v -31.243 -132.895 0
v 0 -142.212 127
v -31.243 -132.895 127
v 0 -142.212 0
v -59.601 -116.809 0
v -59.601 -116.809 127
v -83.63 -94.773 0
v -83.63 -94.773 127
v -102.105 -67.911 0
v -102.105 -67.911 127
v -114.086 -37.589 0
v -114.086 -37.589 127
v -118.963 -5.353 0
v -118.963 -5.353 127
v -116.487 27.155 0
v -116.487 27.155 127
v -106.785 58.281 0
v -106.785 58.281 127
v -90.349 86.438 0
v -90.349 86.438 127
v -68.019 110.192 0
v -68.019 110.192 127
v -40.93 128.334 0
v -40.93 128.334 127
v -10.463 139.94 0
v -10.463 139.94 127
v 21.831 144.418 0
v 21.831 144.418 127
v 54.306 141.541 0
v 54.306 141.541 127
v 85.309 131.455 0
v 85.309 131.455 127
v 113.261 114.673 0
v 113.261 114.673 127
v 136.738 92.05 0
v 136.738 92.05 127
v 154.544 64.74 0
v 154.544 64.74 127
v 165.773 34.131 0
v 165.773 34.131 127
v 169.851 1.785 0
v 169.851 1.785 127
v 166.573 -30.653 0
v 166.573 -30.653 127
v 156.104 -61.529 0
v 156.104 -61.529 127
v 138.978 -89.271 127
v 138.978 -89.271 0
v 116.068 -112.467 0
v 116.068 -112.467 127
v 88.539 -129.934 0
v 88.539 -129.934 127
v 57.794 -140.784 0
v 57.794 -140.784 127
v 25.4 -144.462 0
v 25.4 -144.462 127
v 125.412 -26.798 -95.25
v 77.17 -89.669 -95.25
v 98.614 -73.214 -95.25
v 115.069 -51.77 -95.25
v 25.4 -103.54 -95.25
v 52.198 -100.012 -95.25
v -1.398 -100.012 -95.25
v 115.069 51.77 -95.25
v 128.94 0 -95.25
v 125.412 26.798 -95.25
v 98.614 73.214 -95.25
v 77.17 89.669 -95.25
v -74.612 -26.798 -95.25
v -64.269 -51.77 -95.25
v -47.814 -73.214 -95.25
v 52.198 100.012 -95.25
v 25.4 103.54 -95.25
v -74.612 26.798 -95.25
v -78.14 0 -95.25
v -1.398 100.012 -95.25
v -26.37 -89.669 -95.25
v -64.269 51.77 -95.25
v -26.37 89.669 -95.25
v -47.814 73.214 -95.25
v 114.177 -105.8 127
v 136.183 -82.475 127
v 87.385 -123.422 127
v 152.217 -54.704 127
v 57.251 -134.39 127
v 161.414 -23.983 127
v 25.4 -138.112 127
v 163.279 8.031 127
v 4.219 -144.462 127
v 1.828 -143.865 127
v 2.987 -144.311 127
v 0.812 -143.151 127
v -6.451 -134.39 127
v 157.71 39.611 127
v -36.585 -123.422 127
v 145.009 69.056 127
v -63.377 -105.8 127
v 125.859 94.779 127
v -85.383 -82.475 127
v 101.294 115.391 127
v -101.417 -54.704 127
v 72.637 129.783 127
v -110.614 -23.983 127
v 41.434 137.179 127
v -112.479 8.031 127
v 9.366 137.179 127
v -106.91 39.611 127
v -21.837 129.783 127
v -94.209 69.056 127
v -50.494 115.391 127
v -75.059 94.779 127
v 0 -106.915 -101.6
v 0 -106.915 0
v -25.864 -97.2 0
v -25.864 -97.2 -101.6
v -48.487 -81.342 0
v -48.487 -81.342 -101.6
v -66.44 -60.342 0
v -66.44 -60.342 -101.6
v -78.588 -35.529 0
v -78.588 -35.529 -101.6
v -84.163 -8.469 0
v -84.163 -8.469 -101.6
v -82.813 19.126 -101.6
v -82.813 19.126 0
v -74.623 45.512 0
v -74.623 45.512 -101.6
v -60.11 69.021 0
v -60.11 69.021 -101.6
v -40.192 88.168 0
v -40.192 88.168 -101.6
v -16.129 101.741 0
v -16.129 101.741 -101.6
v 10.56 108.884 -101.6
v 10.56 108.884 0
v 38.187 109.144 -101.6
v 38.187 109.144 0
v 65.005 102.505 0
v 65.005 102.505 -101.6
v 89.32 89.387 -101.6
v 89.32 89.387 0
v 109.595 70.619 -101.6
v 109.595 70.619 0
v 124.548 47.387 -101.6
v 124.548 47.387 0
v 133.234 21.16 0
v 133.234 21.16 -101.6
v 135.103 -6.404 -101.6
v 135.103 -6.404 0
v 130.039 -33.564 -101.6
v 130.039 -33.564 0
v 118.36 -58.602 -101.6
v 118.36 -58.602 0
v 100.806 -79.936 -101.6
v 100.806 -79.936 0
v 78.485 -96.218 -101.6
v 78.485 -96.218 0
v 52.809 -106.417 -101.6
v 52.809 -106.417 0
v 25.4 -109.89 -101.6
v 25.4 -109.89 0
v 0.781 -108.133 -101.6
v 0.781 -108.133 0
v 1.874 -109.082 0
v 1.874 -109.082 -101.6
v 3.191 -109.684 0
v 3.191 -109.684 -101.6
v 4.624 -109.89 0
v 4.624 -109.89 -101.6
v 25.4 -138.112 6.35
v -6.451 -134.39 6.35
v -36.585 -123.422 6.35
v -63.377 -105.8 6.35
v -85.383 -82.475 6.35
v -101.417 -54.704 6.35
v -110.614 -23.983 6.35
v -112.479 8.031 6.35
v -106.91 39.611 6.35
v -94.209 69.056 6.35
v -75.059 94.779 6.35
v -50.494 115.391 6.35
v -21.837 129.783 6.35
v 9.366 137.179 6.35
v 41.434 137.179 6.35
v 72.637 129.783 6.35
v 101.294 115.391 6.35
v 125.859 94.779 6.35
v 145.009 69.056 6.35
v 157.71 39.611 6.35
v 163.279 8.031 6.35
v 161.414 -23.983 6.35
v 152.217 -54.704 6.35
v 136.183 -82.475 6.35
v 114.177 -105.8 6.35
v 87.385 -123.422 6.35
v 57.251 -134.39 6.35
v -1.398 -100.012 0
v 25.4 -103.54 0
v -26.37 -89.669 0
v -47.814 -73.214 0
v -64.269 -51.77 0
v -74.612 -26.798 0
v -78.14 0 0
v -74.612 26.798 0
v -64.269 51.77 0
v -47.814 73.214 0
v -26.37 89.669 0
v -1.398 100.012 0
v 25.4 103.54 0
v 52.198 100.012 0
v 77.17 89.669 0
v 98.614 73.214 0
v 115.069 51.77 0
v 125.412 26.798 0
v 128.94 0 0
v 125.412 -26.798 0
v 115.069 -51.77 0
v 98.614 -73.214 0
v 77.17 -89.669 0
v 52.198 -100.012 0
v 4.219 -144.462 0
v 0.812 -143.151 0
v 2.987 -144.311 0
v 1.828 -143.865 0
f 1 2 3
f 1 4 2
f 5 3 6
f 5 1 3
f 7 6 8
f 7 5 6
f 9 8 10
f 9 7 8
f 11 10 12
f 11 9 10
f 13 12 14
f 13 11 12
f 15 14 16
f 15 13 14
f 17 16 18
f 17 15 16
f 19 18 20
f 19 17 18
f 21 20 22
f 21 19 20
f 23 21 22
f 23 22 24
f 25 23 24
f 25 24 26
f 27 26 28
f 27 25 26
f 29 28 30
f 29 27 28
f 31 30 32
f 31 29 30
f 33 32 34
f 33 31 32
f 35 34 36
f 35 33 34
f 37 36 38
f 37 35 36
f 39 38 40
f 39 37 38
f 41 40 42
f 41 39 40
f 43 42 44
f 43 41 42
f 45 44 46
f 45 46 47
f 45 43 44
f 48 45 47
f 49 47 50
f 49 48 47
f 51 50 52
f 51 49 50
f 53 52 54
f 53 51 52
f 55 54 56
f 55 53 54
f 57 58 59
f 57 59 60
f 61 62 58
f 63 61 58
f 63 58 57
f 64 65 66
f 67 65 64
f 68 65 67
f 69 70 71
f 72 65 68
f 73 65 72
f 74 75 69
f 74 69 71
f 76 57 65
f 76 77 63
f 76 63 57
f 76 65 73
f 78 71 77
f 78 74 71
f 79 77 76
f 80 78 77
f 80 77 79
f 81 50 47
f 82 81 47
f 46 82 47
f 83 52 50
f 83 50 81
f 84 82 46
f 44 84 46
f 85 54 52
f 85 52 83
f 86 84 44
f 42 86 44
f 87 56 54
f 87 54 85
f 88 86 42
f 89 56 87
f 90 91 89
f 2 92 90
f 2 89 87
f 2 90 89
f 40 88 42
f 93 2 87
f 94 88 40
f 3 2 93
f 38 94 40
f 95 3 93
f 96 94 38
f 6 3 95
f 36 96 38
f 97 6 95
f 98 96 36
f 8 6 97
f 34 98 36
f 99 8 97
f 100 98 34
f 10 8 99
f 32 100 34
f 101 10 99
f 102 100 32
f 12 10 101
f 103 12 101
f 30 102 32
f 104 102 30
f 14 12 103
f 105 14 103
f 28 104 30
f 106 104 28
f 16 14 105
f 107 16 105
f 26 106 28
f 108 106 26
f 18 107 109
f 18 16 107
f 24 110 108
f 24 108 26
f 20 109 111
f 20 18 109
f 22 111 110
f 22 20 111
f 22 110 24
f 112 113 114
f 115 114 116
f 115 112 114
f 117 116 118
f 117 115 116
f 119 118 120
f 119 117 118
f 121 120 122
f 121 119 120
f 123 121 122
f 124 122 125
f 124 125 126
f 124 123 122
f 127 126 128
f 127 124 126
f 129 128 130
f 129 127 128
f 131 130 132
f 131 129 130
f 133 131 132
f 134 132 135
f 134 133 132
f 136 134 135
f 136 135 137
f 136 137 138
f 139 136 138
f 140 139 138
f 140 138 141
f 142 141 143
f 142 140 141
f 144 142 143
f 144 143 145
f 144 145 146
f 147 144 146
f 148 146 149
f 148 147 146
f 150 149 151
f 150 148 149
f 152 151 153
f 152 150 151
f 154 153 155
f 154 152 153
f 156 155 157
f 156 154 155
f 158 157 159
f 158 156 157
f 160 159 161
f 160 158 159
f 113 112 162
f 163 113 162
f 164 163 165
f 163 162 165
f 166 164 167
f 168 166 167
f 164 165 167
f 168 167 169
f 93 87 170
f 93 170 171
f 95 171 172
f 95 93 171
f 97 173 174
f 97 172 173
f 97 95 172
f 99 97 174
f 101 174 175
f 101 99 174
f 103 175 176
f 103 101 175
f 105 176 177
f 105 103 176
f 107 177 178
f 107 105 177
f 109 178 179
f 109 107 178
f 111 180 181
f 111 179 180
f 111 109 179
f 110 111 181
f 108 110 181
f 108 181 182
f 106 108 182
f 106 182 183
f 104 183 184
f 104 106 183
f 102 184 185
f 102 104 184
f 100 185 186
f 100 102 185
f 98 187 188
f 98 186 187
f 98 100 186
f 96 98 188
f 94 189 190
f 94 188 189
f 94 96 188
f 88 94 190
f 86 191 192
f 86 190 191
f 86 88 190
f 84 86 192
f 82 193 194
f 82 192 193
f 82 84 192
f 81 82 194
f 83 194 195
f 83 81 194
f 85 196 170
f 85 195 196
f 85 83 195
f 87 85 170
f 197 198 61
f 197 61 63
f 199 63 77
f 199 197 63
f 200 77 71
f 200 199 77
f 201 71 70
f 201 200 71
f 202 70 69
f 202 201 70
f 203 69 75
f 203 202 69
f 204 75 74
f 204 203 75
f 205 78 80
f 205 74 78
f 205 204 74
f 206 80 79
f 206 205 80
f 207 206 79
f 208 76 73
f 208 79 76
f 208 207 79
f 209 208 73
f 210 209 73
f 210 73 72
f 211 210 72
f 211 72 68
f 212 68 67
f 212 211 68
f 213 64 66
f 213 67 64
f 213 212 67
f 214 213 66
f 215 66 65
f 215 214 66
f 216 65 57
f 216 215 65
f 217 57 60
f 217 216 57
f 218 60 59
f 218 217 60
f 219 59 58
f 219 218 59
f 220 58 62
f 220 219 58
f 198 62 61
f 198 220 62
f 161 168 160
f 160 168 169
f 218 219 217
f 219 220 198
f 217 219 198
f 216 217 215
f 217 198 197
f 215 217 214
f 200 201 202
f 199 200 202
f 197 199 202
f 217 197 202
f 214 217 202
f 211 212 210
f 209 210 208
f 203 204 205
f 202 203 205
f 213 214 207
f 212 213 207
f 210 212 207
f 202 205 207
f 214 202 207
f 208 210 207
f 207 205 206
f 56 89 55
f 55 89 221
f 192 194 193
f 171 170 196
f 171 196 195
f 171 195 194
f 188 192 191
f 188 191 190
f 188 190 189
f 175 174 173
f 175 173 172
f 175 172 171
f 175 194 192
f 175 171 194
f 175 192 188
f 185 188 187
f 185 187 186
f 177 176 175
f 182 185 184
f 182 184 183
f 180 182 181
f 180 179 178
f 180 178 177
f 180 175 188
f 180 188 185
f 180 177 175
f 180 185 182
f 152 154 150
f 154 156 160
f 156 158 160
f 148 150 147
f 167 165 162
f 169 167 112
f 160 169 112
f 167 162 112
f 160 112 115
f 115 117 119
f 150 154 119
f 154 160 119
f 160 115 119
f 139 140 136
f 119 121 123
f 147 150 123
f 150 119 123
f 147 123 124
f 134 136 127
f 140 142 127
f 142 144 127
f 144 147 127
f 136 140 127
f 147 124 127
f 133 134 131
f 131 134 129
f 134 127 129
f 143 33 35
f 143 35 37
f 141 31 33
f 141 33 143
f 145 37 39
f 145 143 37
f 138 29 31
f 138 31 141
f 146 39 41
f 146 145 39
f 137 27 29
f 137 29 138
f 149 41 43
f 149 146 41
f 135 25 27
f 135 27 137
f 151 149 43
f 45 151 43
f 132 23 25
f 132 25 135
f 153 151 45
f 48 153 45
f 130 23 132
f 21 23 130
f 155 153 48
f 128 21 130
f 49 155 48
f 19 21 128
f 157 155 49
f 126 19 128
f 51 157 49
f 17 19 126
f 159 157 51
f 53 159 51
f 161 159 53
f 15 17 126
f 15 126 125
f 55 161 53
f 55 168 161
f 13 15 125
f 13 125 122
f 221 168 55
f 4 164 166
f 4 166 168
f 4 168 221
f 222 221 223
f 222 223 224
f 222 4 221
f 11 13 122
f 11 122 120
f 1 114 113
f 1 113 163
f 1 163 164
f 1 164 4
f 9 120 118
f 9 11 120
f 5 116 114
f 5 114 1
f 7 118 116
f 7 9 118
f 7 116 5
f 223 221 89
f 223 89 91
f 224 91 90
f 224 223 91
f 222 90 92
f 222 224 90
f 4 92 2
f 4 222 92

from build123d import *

# Parameters (mm, degrees)
F1_DEPTH    = 25.4
F3_T1_DEPTH = 113.1592478003
F3_T3_DEPTH = 148.0952074612


# Not quite as in the source:
# - a fillet or chamfer that OpenCascade refuses, or shapes differently, is made with other operations: its cross-section is extruded or revolved along the edge and cut away or added


with BuildPart() as f1:
    # F0 (on Right) → F1 (new body)
    with BuildSketch(Plane.YZ):
        Polygon((-103.5402726054, 0), (0, 0), (0, 6.35), (-138.112494323, 6.35), (-138.112494323, 127), (-144.462494323, 127), (-144.462494323, 0), (-109.8902726054, 0), align=None)
        Polygon((-103.5402726054, -95.25), (-103.5402726054, 0), (-109.8902726054, 0), (-109.8902726054, -101.6), (0, -101.6), (0, -95.25), align=None)
    extrude(amount=F1_DEPTH)

    # F1_face (on face) → F2 (revolve)
    with BuildSketch(Plane(origin=(25.4, -92.8938883884, -14.564984288), x_dir=(0, 1, 0), z_dir=(1, 0, 0))):
        Polygon((-51.5686059346, 14.564984288), (-16.996384217, 14.564984288), (-16.996384217, -87.035015712), (92.8938883884, -87.035015712), (92.8938883884, -80.685015712), (-10.646384217, -80.685015712), (-10.646384217, 14.564984288), (92.8938883884, 14.564984288), (92.8938883884, 20.914984288), (-45.2186059346, 20.914984288), (-45.2186059346, 141.564984288), (-51.5686059346, 141.564984288), align=None)
    revolve(axis=Axis((25.4, 0, 3.175), (0, 0, -1)))

    # F3: fillet of radius 5.08 on 4 edges, made by hand

    # F3_s2 → F3_t1 (cut)
    with BuildSketch(Plane.XY.offset(-113.1592478003)):
        with BuildLine():
            ThreePointArc((0, -106.9145079645), (1.8744370031, -109.0820354513), (4.6236991201, -109.8902726054))
            Line((4.6236991201, -109.8902726054), (4.6236991201, -109.9918726054))
            Line((4.6236991201, -109.9918726054), (0, -109.9918726054))
            Line((0, -109.9918726054), (-0.1016, -109.8902726054))
            ThreePointArc((-0.1016, -109.8902726054), (-0.1016, -108.4023902849), (-0.0924739824, -106.9565926716))
            Line((-0.0924739824, -106.9565926716), (0, -106.9145079645))
        make_face()
    extrude(amount=F3_T1_DEPTH, mode=Mode.SUBTRACT)

    # F3_s4 → F3_t3 (cut)
    with BuildSketch(Plane.XY.offset(-10.5476037306)):
        with BuildLine():
            ThreePointArc((4.2190414922, -144.462494323), (1.8281710158, -143.8646967241), (0, -142.2119976163))
            Line((0, -142.2119976163), (-0.0843808298, -142.2685876821))
            ThreePointArc((-0.0843808298, -142.2685876821), (-0.1016, -143.3372459696), (-0.1016, -144.462494323))
            Line((-0.1016, -144.462494323), (0, -144.564094323))
            Line((0, -144.564094323), (4.2190414922, -144.564094323))
            Line((4.2190414922, -144.564094323), (4.2190414922, -144.462494323))
        make_face()
    extrude(amount=F3_T3_DEPTH, mode=Mode.SUBTRACT)


solid = f1.part
